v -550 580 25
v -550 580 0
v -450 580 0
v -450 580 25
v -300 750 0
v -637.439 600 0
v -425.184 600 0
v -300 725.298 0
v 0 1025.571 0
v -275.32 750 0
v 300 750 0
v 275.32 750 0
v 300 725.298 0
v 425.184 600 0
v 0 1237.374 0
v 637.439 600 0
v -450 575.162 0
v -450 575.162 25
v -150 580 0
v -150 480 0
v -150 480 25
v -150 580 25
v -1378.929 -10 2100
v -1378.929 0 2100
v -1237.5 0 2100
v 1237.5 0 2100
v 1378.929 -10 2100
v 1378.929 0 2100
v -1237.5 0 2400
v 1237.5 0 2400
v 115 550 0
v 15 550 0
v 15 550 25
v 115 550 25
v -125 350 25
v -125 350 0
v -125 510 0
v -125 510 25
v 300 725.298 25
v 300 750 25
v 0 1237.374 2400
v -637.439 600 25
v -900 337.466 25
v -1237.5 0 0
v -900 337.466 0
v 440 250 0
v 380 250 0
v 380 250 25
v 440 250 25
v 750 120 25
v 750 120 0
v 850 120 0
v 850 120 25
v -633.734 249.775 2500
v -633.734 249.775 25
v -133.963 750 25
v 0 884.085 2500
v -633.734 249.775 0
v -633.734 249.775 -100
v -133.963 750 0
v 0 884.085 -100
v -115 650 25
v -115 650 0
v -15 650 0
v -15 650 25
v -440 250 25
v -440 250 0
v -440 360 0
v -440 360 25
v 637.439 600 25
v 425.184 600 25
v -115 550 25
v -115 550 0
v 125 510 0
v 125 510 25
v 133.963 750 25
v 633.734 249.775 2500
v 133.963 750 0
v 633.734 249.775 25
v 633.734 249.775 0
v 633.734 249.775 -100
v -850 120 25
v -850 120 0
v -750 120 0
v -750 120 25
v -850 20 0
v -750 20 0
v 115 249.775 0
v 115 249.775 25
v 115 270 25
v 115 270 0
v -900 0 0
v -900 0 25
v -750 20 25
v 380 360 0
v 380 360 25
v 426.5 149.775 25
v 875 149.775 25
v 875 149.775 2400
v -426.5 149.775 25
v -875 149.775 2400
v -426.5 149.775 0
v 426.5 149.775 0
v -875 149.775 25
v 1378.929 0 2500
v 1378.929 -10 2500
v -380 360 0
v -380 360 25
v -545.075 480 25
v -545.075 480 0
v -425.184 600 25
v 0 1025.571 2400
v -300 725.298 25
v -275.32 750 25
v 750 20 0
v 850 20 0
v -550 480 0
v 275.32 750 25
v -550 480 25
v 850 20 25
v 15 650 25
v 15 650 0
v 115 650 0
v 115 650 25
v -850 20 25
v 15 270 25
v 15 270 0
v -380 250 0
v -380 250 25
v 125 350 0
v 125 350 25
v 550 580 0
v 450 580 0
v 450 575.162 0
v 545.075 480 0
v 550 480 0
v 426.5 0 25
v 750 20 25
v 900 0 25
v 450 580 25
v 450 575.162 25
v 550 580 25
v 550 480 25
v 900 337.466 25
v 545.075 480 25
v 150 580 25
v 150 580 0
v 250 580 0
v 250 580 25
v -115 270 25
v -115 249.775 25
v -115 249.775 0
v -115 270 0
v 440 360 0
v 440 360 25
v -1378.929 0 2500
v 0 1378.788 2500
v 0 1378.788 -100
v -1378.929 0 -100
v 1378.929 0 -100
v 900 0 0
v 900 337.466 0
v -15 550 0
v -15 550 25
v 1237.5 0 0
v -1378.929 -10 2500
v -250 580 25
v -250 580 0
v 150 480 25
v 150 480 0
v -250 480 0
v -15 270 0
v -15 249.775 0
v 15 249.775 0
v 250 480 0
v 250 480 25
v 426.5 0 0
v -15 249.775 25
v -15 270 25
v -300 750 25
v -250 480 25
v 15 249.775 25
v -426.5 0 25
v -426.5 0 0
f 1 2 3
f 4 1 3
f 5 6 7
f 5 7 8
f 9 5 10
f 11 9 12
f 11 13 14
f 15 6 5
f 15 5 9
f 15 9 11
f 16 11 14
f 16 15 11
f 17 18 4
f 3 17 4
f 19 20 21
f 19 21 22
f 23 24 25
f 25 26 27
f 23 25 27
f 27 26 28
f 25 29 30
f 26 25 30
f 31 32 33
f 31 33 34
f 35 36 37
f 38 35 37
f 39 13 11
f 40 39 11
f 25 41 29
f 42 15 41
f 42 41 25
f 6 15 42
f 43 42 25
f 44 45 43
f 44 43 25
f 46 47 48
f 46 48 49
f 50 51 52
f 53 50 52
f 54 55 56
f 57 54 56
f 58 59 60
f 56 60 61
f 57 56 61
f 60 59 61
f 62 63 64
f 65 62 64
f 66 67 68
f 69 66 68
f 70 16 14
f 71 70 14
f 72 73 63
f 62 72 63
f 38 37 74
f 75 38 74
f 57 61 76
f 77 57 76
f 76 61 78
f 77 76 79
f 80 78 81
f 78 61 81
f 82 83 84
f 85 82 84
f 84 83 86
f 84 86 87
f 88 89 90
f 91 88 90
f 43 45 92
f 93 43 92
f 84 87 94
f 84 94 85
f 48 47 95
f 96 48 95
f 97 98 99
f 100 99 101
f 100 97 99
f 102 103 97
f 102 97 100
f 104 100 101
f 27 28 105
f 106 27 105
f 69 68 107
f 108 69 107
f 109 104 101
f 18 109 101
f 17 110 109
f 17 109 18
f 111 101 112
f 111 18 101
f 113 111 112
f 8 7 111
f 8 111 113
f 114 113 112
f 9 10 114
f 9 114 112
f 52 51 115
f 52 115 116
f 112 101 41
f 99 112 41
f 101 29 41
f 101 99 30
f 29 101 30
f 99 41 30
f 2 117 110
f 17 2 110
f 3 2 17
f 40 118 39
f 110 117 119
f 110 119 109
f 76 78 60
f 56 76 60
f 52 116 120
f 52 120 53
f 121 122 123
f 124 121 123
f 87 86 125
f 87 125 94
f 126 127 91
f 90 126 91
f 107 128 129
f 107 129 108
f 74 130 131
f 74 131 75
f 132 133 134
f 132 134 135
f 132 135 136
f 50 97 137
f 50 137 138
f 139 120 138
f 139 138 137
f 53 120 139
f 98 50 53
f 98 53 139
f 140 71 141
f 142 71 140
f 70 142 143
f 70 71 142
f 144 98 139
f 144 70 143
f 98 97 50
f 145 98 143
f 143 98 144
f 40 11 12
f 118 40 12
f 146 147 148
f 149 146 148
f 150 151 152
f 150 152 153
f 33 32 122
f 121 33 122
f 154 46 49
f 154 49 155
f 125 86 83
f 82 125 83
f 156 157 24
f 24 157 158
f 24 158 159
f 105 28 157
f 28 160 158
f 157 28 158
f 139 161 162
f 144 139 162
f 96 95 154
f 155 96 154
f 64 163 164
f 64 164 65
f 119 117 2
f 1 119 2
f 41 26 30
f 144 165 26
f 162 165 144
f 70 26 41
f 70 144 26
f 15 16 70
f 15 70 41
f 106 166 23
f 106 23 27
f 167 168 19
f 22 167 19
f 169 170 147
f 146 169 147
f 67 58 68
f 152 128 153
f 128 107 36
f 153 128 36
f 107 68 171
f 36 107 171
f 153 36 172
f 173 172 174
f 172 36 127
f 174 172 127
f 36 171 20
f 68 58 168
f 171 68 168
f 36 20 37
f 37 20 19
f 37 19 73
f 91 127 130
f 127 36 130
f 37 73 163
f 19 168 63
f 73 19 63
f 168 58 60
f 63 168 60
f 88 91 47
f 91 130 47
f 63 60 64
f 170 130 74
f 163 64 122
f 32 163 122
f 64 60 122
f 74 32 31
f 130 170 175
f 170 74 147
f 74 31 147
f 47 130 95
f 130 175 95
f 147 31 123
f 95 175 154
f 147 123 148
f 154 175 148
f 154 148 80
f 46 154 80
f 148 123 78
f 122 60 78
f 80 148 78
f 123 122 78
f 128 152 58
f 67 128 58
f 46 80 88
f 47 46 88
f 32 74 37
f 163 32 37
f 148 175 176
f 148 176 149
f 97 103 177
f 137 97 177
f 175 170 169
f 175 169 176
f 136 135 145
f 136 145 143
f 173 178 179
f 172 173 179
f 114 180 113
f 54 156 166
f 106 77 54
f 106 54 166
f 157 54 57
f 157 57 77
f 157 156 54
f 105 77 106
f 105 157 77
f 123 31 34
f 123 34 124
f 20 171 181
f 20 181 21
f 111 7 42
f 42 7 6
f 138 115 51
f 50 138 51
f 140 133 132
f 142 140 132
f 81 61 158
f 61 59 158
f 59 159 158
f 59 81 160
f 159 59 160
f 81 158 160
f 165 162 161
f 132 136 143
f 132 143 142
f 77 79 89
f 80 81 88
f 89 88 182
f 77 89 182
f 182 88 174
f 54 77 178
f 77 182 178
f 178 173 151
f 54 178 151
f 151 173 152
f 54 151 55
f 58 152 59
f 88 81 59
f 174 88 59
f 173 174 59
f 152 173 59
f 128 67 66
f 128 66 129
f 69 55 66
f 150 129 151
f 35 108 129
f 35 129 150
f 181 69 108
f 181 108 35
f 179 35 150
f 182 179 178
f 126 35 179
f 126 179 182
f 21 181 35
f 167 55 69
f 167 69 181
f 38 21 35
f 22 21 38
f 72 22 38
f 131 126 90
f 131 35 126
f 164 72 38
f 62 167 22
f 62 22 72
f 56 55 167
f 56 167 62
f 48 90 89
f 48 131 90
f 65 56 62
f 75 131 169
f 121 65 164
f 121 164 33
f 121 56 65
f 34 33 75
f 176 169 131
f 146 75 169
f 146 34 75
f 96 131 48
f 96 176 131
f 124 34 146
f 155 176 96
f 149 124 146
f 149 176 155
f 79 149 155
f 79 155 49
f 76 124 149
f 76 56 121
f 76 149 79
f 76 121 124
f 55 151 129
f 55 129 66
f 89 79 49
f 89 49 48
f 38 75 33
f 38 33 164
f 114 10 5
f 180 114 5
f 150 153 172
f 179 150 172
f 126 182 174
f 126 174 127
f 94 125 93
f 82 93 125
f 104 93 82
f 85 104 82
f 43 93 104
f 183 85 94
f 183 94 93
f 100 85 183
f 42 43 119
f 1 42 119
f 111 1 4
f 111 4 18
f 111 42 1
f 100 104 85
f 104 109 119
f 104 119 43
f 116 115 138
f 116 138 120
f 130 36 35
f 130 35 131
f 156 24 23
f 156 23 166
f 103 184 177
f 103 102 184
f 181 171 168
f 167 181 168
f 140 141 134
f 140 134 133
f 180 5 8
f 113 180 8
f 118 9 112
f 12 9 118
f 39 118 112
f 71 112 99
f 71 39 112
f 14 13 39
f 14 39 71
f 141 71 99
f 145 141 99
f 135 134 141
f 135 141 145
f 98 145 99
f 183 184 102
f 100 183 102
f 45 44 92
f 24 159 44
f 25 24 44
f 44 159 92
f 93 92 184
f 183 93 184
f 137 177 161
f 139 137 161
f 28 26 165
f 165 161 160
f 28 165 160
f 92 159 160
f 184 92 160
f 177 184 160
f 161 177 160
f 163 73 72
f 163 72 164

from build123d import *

# Parameters (mm, degrees)
F1_DEPTH = 2400
F2_T     = 100
F3_W     = 2757.8571443297
F3_H     = 400
F4_DEPTH = 10
F5_W     = 100
F5_H     = 100
F5_W_2   = 60
F5_H_2   = 110
F5_W_3   = 250
F5_H_3   = 160
F6_DEPTH = 25


with BuildPart() as f1:
    # F0 (on Top) → F1 (new body)
    with BuildSketch(Plane.XY):
        Polygon((1237.5, 0), (0, 1237.3737309318), (-1237.5, 0), align=None)
        Polygon((-875, 149.7747893482), (0, 1025.5709985202), (875, 149.7747893482), align=None, mode=Mode.SUBTRACT)
    extrude(amount=F1_DEPTH)

    # F2
    f2_openings = [f1.faces().sort_by_distance(p)[0] for p in [
        (0, 0, 1200),
    ]]
    offset(amount=F2_T, openings=f2_openings, kind=Kind.INTERSECTION)

    # F3 (on face) → F4 (join)
    with BuildSketch(Plane.XZ):
        with Locations((0, 2300)):
            Rectangle(F3_W, F3_H)
    extrude(amount=F4_DEPTH)

    # F5 (on face) → F6 (join)
    with BuildSketch(Plane.XY):
        Polygon((-637.4387723862, 600), (-900, 337.4655629814), (-900, 0), (-426.5, 0), (-426.5, 150), (426.5, 150), (426.5, 0), (900, 0), (900, 337.4655629814), (637.4387723862, 600), (300, 600), (300, 750), (-300, 750), (-300, 600), align=None)
        with Locations((-800, 70)):
            Rectangle(F5_W, F5_H, mode=Mode.SUBTRACT)
        with Locations((-65, 220)):
            Rectangle(F5_W, F5_H, mode=Mode.SUBTRACT)
        with Locations((-410, 305)):
            Rectangle(F5_W_2, F5_H_2, mode=Mode.SUBTRACT)
        with Locations((800, 70)):
            Rectangle(F5_W, F5_H, mode=Mode.SUBTRACT)
        with Locations((65, 220)):
            Rectangle(F5_W, F5_H, mode=Mode.SUBTRACT)
        with Locations((410, 305)):
            Rectangle(F5_W_2, F5_H_2, mode=Mode.SUBTRACT)
        with Locations((-500, 530)):
            Rectangle(F5_W, F5_H, mode=Mode.SUBTRACT)
        with Locations((-200, 530)):
            Rectangle(F5_W, F5_H, mode=Mode.SUBTRACT)
        with Locations((-65, 600)):
            Rectangle(F5_W, F5_H, mode=Mode.SUBTRACT)
        with Locations((0, 430)):
            Rectangle(F5_W_3, F5_H_3, mode=Mode.SUBTRACT)
        with Locations((200, 530)):
            Rectangle(F5_W, F5_H, mode=Mode.SUBTRACT)
        with Locations((500, 530)):
            Rectangle(F5_W, F5_H, mode=Mode.SUBTRACT)
        with Locations((65, 600)):
            Rectangle(F5_W, F5_H, mode=Mode.SUBTRACT)
    extrude(amount=F6_DEPTH)


solid = f1.part
